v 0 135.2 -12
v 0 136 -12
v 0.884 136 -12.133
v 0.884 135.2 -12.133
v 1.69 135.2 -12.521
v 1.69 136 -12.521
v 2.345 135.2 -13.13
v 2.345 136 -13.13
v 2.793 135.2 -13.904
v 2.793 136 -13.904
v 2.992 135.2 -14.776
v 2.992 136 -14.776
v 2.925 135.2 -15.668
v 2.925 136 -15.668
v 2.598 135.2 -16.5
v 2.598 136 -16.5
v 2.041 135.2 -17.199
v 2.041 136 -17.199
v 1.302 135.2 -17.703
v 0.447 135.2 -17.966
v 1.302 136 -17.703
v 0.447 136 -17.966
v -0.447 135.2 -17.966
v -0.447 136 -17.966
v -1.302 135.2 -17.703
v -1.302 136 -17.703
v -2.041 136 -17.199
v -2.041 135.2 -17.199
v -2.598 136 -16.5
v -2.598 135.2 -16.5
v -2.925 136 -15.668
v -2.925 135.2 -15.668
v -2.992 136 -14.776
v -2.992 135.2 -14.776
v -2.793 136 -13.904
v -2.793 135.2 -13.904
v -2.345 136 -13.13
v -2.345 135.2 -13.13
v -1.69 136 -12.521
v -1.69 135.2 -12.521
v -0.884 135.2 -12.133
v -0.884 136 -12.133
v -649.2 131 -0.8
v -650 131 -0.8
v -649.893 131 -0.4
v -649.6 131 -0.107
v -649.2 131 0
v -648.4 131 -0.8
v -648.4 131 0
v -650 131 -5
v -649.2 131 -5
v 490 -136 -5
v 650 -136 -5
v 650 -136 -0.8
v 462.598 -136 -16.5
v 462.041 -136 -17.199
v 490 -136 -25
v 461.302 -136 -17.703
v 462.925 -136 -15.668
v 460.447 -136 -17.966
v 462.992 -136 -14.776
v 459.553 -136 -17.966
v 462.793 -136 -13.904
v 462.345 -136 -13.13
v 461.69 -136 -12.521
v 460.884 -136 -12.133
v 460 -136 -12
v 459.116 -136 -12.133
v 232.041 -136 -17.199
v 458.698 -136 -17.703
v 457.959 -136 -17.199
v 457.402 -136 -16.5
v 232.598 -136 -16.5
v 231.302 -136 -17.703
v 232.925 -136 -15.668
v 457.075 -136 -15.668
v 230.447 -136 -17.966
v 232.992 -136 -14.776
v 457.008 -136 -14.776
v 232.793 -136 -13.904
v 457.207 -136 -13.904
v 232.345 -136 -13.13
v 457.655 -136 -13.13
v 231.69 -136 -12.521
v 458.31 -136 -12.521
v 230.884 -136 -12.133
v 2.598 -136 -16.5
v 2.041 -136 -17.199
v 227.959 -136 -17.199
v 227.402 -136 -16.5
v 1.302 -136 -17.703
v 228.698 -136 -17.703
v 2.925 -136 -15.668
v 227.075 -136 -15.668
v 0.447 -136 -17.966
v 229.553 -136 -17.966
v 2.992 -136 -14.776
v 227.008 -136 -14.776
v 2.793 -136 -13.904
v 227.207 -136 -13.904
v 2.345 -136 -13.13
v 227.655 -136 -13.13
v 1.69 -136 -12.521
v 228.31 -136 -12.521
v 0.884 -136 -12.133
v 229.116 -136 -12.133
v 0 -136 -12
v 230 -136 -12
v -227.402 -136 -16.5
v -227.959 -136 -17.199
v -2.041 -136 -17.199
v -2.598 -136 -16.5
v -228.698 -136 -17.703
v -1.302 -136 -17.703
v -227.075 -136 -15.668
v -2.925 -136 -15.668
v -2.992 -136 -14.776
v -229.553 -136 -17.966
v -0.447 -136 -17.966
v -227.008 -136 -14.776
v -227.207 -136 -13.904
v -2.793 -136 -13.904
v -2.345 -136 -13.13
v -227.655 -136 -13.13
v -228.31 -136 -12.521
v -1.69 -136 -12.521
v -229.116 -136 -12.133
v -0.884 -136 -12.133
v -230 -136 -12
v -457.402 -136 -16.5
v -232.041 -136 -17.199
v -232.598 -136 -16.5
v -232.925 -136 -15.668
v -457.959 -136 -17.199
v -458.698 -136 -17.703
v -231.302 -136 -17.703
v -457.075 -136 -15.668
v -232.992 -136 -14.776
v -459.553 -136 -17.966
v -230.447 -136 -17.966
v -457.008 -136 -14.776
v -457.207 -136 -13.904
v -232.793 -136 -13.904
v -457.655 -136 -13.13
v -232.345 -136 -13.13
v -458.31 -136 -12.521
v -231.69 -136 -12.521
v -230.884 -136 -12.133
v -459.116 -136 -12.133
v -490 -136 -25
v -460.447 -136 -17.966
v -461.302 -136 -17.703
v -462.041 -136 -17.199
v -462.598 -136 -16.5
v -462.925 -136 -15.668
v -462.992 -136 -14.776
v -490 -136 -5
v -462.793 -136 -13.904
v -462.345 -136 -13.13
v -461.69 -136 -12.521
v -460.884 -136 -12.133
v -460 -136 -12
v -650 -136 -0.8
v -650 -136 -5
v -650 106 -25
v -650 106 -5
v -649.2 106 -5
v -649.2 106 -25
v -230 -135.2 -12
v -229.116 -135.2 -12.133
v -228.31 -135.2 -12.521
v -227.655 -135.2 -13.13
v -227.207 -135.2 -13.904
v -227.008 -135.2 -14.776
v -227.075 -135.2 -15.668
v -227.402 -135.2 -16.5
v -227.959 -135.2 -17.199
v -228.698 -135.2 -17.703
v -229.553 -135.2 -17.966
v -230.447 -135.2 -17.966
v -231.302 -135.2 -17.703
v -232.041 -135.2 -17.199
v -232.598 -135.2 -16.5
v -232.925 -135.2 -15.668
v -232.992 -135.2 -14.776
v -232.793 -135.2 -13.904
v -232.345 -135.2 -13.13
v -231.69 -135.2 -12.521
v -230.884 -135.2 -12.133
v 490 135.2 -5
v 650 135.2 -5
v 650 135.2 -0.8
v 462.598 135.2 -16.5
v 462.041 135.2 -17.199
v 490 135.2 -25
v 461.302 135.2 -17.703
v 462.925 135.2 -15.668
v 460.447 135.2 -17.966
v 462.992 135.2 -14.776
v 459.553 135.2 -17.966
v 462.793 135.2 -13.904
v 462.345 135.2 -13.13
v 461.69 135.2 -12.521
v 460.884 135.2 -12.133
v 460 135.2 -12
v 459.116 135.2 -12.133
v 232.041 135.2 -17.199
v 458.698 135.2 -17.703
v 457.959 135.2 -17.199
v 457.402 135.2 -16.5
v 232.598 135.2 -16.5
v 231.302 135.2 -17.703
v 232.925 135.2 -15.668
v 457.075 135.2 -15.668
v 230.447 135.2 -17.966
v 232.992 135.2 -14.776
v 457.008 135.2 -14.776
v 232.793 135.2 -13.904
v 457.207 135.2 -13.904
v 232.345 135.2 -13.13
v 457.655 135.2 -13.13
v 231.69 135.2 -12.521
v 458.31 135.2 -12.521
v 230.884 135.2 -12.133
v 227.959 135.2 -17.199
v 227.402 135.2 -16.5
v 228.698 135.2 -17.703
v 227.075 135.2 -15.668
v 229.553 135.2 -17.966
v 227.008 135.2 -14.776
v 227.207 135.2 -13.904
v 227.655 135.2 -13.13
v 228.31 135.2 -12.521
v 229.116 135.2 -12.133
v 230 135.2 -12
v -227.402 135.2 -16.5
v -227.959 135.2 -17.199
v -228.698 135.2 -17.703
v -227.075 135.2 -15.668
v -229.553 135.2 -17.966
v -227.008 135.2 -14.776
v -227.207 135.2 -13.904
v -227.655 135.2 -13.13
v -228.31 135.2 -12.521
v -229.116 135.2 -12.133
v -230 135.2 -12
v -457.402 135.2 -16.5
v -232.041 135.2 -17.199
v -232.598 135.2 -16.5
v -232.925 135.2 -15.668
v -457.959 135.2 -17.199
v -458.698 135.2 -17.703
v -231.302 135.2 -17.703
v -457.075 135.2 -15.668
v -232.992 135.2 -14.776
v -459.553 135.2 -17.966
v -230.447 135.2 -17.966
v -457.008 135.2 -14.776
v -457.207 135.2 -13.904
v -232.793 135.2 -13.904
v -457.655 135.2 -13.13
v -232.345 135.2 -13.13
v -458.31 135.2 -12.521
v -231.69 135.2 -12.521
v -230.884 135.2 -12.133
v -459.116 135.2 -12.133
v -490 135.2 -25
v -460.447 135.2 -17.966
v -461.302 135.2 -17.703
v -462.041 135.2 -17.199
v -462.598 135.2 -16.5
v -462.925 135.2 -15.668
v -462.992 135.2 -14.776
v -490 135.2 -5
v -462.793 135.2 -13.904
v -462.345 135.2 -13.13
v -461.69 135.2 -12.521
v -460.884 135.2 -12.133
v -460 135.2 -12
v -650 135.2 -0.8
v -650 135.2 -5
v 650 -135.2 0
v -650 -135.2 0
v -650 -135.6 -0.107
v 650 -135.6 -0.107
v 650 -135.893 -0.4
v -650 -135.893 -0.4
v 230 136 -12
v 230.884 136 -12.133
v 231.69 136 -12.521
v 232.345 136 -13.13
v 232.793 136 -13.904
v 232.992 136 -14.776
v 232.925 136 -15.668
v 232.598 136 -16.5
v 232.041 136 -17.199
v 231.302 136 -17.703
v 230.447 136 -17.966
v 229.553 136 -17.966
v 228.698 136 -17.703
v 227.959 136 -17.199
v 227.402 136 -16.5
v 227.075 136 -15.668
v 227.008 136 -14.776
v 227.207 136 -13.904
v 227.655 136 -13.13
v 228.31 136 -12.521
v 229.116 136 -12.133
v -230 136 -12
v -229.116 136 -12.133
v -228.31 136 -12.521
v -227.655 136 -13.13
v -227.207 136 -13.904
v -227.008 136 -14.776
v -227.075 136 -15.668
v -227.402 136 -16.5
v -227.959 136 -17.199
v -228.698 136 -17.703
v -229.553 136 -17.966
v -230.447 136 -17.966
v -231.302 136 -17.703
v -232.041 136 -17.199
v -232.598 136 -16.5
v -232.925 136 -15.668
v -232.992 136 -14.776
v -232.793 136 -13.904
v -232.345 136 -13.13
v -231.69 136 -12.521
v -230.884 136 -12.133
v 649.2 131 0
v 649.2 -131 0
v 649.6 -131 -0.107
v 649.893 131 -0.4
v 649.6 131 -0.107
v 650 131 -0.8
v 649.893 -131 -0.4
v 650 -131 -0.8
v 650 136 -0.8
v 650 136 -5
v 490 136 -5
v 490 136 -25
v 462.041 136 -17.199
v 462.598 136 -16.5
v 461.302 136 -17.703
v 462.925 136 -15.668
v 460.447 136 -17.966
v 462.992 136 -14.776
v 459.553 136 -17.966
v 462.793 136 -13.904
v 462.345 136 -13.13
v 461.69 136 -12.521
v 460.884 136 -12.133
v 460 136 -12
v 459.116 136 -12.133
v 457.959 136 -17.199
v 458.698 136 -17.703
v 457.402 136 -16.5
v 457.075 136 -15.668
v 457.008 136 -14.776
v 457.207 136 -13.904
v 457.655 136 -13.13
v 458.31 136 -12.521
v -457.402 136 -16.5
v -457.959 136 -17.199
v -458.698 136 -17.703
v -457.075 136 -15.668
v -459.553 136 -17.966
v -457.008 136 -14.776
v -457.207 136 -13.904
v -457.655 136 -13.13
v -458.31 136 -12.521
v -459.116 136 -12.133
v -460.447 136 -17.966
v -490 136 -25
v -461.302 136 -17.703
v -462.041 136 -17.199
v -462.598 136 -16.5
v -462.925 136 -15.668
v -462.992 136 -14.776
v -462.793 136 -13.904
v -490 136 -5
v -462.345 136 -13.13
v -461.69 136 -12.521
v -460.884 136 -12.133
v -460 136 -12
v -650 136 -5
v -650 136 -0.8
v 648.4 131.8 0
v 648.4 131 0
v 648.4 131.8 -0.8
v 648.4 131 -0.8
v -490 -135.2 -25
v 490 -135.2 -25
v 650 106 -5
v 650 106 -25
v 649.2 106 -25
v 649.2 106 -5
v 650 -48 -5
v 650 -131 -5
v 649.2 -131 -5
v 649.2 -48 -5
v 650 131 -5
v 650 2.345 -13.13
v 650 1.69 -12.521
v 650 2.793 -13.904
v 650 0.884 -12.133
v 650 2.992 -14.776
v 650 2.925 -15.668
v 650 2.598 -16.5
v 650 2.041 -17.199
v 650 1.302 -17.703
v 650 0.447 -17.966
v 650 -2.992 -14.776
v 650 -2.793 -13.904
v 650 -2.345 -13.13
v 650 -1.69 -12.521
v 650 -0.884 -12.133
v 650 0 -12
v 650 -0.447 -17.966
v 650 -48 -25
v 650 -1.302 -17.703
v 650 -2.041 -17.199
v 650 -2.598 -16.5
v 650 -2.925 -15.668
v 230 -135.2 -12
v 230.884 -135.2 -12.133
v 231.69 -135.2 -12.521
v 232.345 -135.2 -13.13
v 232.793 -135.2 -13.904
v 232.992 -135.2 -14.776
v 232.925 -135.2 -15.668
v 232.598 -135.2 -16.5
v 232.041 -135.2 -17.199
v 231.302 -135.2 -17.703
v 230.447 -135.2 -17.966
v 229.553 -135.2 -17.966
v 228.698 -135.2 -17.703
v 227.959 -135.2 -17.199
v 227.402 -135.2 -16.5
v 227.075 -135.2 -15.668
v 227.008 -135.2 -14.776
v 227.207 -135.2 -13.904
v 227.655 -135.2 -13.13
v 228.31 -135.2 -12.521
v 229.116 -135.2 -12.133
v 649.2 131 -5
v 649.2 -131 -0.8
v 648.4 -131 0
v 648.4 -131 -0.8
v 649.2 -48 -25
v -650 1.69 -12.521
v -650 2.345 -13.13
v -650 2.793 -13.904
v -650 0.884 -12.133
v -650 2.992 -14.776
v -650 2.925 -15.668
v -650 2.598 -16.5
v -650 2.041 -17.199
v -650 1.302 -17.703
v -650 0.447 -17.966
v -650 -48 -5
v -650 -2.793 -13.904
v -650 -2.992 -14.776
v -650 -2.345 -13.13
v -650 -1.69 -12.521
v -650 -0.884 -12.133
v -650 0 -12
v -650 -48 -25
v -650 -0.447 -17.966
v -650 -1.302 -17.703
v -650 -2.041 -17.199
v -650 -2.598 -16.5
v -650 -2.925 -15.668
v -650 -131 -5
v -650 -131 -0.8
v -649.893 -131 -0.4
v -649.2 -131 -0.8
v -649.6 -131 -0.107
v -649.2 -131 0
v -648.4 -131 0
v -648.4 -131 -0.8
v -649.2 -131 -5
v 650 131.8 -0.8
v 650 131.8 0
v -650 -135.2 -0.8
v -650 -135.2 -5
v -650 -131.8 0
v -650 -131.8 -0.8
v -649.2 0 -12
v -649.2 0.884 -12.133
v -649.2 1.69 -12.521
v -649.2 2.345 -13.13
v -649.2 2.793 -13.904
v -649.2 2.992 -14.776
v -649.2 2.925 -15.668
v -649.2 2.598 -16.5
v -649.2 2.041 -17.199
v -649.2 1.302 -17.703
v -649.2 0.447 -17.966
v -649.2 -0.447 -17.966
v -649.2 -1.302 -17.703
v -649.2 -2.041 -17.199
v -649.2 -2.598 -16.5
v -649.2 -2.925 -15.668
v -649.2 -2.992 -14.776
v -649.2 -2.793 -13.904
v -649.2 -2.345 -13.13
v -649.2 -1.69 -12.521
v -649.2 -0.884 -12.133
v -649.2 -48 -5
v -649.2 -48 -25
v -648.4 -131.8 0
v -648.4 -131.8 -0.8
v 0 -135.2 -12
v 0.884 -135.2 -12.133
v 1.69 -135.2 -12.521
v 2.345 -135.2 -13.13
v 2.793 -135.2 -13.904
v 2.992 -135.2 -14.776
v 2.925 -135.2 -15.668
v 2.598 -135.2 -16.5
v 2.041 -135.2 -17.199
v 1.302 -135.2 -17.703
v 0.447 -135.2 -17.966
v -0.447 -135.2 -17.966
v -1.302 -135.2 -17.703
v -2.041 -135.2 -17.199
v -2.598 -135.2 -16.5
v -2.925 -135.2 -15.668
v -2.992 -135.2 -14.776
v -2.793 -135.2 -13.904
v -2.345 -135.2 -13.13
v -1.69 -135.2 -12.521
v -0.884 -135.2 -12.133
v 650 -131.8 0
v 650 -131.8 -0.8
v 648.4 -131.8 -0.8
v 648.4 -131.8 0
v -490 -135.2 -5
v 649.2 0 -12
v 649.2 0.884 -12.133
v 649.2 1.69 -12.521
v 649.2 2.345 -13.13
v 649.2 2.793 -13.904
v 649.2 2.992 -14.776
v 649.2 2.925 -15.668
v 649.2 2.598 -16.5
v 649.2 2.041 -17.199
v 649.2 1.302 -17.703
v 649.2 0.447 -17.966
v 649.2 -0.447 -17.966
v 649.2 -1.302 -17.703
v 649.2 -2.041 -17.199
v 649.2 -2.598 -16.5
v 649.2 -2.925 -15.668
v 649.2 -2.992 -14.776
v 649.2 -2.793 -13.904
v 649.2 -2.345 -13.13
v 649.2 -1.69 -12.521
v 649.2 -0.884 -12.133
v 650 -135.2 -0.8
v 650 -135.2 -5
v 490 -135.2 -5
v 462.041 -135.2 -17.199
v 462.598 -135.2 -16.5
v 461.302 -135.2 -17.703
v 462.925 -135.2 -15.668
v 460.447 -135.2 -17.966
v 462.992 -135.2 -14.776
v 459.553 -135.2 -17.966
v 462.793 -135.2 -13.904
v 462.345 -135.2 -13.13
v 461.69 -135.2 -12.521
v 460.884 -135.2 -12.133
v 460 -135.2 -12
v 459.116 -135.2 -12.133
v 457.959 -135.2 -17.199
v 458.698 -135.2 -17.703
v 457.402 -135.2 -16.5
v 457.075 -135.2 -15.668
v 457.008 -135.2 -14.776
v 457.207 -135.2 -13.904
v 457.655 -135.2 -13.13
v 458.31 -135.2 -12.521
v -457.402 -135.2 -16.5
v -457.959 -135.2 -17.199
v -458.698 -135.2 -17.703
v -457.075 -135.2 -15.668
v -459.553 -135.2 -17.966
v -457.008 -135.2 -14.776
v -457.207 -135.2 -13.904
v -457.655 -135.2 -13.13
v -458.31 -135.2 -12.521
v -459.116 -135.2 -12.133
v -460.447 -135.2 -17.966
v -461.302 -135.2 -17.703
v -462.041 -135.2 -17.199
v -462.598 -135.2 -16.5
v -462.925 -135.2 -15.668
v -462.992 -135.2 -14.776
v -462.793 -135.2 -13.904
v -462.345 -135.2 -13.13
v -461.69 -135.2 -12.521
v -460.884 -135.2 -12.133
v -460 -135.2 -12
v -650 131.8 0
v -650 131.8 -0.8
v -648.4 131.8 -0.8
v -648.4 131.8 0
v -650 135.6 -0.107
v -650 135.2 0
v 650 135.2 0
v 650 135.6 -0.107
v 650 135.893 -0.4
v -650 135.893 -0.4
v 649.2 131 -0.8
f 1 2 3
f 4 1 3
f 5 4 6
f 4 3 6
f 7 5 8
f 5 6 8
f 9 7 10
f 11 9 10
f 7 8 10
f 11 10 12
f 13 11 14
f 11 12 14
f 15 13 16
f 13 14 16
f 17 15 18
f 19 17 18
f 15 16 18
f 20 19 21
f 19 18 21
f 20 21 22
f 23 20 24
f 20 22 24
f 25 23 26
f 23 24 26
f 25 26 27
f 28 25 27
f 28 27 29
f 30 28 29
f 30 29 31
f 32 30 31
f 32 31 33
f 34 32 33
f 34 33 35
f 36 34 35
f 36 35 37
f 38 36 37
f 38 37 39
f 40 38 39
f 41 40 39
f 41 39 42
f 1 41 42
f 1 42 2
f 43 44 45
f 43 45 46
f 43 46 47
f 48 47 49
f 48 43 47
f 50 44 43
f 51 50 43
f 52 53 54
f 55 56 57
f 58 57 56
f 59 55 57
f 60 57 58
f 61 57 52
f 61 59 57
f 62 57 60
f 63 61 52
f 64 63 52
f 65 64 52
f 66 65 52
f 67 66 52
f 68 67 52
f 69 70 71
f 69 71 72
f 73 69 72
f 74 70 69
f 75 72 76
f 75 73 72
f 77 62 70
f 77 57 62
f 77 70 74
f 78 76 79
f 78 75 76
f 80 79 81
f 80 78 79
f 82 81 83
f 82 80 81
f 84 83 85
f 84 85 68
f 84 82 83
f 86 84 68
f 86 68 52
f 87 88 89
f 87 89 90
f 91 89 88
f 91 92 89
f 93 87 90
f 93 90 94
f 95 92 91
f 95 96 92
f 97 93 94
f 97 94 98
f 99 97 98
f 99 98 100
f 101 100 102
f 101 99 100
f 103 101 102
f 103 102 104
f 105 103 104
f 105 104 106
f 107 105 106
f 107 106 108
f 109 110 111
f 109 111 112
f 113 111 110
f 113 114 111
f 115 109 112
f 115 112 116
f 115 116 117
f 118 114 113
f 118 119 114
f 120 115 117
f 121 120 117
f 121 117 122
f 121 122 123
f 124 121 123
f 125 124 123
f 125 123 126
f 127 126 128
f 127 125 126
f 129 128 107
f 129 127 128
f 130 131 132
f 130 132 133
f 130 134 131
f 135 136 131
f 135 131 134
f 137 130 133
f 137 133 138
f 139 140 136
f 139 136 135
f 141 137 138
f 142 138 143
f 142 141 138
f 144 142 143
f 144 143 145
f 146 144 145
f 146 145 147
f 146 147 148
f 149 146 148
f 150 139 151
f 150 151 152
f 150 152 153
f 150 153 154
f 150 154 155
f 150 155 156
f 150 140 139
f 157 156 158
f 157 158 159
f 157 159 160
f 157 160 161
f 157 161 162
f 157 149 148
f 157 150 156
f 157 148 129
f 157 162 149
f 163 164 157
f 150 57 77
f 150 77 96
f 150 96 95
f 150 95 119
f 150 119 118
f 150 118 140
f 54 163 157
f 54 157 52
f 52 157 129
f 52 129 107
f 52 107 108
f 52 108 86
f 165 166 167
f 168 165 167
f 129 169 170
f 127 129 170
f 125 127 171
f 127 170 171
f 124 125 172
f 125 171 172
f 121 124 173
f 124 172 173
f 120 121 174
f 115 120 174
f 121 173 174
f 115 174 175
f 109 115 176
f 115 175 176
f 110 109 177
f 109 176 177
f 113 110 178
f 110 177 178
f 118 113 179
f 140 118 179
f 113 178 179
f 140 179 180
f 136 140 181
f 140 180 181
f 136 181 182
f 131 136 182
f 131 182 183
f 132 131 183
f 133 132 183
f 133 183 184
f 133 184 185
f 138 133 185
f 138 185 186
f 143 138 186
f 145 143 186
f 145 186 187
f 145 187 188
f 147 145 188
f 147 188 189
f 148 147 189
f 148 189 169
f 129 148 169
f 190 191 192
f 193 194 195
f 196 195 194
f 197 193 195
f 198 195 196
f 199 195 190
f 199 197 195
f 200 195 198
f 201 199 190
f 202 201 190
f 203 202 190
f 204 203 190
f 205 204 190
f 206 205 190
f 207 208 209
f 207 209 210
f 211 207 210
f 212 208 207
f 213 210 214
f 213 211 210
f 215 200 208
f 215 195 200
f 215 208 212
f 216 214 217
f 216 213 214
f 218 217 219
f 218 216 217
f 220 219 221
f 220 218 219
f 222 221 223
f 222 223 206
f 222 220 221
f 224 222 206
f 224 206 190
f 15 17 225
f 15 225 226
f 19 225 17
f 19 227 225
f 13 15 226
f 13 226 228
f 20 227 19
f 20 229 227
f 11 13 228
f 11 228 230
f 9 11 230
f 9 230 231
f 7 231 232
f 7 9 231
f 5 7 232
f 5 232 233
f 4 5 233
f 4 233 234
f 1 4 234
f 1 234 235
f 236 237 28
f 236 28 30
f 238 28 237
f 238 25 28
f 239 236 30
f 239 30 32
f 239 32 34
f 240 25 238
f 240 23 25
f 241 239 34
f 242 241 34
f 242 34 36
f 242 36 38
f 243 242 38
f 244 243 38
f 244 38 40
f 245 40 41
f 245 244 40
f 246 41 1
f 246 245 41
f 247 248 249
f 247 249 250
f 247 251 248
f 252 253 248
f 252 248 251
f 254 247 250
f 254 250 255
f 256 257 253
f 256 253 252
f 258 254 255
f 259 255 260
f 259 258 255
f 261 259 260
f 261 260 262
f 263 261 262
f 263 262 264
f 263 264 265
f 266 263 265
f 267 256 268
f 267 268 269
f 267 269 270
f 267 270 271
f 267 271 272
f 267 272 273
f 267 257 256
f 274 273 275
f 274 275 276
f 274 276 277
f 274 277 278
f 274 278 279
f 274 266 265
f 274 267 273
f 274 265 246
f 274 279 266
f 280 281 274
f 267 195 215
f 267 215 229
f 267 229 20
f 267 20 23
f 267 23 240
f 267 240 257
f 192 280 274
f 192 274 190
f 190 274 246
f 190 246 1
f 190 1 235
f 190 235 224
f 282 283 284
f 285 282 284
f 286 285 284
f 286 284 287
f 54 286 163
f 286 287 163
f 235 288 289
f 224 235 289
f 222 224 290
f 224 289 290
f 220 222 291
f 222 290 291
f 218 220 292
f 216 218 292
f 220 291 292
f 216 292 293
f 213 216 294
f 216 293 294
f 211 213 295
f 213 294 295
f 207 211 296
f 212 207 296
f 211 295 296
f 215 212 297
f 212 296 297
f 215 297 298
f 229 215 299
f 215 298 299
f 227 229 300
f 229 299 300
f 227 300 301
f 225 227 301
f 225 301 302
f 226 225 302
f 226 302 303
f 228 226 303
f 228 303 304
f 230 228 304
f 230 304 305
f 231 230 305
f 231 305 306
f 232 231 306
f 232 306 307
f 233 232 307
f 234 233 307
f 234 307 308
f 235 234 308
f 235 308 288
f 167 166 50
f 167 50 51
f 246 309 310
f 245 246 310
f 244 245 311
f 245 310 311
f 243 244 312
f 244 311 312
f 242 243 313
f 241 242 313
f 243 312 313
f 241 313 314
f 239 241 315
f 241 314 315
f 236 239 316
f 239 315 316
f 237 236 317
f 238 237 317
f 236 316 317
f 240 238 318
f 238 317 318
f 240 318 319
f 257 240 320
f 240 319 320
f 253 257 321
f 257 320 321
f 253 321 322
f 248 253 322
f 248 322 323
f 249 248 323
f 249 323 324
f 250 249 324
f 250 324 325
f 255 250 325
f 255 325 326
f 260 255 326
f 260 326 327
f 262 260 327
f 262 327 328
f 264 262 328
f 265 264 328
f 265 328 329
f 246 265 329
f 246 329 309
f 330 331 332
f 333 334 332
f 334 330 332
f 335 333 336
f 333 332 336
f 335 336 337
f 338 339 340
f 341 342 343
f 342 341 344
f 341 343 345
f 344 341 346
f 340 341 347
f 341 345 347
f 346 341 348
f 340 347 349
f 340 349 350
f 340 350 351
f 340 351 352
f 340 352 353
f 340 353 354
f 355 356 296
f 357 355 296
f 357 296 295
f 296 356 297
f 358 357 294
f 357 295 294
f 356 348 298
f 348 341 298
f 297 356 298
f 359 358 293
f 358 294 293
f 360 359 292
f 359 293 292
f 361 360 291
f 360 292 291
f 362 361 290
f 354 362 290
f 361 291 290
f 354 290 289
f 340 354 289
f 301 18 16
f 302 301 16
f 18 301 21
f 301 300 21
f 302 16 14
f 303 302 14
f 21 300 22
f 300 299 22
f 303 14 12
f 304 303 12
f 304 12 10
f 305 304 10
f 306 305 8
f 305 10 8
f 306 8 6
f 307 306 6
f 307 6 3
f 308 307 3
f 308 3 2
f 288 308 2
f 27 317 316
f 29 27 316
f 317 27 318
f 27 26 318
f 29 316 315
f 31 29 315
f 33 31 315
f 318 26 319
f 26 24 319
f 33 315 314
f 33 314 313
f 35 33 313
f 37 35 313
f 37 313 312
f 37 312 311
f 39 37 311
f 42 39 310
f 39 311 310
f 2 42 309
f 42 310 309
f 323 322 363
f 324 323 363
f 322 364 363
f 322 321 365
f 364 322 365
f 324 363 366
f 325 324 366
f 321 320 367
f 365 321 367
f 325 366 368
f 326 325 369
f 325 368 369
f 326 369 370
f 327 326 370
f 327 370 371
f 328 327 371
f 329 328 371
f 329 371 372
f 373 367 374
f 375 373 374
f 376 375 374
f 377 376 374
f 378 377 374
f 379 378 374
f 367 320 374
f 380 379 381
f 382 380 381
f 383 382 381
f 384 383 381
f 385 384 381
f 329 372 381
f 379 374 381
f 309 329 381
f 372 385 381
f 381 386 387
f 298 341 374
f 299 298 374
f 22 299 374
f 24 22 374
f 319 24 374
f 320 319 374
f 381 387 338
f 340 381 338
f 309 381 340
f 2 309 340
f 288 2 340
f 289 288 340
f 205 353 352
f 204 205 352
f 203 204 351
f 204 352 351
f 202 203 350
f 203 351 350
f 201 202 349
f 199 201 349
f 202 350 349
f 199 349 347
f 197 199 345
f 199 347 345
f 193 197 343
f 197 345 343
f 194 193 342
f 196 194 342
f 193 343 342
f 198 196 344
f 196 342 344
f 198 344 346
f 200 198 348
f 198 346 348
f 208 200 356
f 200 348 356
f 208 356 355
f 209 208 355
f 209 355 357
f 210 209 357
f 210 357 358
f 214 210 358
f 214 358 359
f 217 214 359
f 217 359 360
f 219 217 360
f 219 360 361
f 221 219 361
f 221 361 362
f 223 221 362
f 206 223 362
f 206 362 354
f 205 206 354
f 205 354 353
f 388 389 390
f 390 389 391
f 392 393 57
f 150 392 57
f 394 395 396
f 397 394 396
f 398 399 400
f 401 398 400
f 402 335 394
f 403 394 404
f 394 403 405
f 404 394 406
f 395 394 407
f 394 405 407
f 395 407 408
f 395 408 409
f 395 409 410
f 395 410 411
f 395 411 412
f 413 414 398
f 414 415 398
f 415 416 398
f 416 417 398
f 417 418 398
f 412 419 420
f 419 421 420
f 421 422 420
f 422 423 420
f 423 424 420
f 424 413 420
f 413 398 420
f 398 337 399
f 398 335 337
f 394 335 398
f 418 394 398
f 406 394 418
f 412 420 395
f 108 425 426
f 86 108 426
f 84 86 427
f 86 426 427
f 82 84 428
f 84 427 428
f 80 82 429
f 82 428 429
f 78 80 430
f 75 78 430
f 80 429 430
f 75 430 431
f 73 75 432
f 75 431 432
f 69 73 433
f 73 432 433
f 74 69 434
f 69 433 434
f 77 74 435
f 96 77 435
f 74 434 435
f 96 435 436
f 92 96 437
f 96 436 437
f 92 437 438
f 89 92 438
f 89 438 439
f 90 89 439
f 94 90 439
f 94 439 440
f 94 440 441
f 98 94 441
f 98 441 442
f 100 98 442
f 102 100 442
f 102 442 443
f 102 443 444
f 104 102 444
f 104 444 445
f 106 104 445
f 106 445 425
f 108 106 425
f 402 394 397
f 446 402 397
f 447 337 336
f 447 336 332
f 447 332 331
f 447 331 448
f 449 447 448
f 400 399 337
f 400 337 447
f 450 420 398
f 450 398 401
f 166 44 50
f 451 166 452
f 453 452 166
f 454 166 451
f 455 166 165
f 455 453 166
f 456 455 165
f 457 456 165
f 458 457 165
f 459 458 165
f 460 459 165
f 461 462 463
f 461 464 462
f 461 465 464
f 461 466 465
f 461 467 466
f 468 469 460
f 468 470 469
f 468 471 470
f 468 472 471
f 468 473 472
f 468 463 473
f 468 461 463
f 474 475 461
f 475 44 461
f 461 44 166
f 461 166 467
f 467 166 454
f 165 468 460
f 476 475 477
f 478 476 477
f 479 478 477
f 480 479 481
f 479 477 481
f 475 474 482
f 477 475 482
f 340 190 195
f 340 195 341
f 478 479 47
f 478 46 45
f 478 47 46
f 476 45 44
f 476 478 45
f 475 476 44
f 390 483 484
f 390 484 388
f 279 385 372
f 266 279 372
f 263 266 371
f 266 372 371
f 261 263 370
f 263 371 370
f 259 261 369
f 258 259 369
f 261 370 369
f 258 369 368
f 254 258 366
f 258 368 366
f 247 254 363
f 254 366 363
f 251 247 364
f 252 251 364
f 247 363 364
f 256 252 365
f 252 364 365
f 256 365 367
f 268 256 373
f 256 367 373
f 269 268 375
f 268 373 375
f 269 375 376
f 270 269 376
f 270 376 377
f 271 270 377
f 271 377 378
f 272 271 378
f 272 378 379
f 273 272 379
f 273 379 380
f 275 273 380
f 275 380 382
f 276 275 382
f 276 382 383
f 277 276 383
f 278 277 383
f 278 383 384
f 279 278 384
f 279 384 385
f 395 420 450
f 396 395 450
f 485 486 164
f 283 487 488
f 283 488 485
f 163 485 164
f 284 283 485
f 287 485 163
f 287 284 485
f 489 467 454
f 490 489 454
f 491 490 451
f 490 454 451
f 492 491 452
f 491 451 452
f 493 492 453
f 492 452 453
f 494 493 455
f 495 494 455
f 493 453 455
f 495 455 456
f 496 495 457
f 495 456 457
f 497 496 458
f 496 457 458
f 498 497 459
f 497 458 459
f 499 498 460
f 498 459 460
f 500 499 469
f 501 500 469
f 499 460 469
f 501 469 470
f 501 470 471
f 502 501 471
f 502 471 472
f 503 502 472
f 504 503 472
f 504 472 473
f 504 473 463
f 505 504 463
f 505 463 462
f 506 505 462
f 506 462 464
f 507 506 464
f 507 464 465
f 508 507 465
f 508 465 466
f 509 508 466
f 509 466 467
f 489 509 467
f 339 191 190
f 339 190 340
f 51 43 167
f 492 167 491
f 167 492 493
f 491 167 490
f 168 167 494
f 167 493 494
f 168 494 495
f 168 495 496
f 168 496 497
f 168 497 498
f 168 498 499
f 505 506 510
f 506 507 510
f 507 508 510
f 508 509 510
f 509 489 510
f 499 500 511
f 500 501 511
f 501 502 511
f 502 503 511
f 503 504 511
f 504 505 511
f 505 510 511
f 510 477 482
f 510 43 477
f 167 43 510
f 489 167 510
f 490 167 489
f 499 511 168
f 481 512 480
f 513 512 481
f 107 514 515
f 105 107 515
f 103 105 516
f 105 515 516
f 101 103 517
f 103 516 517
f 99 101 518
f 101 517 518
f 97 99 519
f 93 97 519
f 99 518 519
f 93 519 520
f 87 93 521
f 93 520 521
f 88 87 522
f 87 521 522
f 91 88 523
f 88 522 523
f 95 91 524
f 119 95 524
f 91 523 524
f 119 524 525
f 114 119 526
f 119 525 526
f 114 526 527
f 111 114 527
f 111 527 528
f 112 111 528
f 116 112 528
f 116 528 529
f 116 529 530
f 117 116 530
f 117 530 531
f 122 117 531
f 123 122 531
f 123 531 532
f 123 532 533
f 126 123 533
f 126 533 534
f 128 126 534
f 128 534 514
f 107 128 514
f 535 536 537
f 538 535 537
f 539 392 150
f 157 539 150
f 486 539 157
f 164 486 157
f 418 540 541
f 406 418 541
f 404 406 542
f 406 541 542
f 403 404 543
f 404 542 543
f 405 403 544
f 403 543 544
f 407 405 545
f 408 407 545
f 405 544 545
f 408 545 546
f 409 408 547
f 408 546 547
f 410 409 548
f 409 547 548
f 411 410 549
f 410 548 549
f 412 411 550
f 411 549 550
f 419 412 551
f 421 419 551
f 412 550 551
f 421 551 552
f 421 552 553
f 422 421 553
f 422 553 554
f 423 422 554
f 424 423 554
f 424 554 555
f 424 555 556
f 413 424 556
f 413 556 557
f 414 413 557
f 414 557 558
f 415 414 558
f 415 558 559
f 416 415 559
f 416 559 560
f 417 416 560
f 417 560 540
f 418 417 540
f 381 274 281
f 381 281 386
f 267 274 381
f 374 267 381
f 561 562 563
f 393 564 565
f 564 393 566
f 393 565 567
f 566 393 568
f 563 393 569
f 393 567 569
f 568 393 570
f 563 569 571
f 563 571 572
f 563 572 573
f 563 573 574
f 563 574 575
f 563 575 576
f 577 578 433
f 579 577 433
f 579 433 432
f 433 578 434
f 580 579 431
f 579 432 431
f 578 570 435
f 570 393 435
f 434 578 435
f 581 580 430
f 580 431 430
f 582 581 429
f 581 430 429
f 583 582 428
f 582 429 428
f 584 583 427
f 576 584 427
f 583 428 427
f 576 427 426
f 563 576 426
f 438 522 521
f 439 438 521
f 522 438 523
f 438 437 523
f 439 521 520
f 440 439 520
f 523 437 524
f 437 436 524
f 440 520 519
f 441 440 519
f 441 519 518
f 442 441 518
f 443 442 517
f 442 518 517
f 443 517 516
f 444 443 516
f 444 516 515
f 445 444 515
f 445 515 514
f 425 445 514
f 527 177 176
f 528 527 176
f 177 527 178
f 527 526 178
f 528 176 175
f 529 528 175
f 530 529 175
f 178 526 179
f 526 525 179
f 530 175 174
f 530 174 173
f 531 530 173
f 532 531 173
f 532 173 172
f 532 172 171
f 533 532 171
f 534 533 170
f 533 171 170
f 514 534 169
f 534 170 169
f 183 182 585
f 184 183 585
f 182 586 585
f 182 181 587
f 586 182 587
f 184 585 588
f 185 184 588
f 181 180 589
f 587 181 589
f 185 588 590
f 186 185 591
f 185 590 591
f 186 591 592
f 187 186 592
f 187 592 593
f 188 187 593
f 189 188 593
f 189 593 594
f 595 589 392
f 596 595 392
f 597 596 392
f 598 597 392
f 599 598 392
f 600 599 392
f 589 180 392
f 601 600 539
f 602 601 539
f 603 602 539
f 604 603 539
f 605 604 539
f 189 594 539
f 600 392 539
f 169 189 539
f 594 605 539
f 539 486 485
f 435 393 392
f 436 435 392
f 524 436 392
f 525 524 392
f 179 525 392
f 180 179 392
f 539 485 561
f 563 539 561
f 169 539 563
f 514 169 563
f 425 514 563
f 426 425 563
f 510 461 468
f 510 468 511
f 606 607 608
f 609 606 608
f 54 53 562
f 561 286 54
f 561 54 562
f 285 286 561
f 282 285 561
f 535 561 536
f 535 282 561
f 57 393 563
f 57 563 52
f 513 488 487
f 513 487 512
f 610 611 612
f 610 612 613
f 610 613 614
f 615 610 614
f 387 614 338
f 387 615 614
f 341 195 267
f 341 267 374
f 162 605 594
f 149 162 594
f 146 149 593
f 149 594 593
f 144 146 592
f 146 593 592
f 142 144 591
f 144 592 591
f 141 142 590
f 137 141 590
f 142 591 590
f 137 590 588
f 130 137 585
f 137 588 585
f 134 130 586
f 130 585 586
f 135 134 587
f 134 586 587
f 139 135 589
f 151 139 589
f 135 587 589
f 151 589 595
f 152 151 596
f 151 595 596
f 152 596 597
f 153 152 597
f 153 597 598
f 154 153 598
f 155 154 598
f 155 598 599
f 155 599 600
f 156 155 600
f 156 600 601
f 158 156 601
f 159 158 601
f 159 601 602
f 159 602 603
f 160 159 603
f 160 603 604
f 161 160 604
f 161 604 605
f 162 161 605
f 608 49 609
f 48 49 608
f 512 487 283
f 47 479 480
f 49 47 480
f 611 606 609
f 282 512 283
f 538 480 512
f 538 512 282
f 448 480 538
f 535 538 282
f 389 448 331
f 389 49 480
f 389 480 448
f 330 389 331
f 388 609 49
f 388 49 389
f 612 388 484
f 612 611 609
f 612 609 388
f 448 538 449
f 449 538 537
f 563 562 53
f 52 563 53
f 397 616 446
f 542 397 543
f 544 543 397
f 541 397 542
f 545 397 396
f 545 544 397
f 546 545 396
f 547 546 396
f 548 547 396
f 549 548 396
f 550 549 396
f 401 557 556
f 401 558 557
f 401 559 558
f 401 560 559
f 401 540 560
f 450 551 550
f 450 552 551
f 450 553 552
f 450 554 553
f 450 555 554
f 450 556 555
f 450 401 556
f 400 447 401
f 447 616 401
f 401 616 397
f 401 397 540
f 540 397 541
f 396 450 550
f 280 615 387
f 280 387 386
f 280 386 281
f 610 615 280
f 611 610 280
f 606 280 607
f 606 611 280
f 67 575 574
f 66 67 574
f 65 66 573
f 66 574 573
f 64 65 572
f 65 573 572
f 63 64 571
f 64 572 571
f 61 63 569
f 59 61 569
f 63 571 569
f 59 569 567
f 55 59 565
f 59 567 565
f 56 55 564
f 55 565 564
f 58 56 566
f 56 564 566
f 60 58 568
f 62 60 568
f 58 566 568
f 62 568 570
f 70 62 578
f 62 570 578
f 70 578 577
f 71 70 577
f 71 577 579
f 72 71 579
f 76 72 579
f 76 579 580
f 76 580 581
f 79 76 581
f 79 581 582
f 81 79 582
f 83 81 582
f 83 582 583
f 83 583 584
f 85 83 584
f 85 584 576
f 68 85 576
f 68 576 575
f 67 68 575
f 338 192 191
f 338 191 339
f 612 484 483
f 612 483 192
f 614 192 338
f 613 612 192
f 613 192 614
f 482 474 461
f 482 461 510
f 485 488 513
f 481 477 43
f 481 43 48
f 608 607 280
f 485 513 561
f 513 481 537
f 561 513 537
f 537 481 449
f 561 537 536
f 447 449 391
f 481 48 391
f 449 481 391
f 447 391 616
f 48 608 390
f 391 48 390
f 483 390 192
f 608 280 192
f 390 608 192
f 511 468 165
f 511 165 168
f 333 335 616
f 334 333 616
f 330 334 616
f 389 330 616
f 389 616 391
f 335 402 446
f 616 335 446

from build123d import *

# Parameters (mm, degrees)
SKETCH_1_W                   = 1300
SKETCH_1_H                   = 272
SM_BASE_FLANGE_1_DEPTH       = 0.8
SM_START                     = -650
SM_EDGE_FLANGE_1_DEPTH       = 1300
SM_START_2                   = -490
SM_EDGE_FLANGE_1_2_OUTLINE_W = 0.8
SM_EDGE_FLANGE_1_2_OUTLINE_H = 24.2
SM_EDGE_FLANGE_1_2_DEPTH     = 980
SM_EDGE_FLANGE_1_3_OUTLINE_W = 0.8
SM_EDGE_FLANGE_1_3_OUTLINE_H = 4.2
SM_EDGE_FLANGE_1_3_DEPTH     = 1300
SKETCH_11_R                  = 3
CUT_EXTRUDE_1_DEPTH          = 706.059571951
SM_START_3                   = -131.8
SM_EDGE_FLANGE_2_DEPTH       = 263.6
SM_EDGE_FLANGE_2_2_DEPTH     = 0.8
SM_START_4                   = 131
SM_EDGE_FLANGE_2_3_DEPTH     = 0.8
SM_START_5                   = -48
SM_EDGE_FLANGE_2_4_OUTLINE_W = 0.8
SM_EDGE_FLANGE_2_4_OUTLINE_H = 24.2
SM_EDGE_FLANGE_2_4_DEPTH     = 154
SM_START_6                   = -131
SM_EDGE_FLANGE_2_5_OUTLINE_W = 0.8
SM_EDGE_FLANGE_2_5_OUTLINE_H = 4.2
SM_EDGE_FLANGE_2_5_DEPTH     = 262
SKETCH_15_R                  = 3
CUT_EXTRUDE_2_DEPTH          = 1308.33354581


# Read off the part's stored shape, not the designer's step: 边线-法兰1, 边线-法兰2
# Sheet-metal steps are written as plain solids
with BuildPart() as part:
    # Sketch 1 → 基体-法兰1 (new body)
    with BuildSketch(Plane.XY):
        Rectangle(SKETCH_1_W, SKETCH_1_H)
    extrude(amount=-SM_BASE_FLANGE_1_DEPTH)

    # 边线-法兰1 outline → 边线-法兰1 (cut)
    with BuildSketch(Plane.YZ.offset(SM_START)):
        with BuildLine():
            Line((136, 0), (135.2, 0))
            ThreePointArc((135.2, 0), (135.765685425, -0.234314575), (136, -0.8))
            Line((136, -0.8), (136, 0))
        make_face()
    sm_edge_flange_1 = extrude(amount=SM_EDGE_FLANGE_1_DEPTH, mode=Mode.SUBTRACT)

    # Sm Edge Flange 1 2 outline → Sm Edge Flange 1 2 (add)
    with BuildSketch(Plane.YZ.offset(SM_START_2)):
        with Locations((135.6, -12.9)):
            Rectangle(SM_EDGE_FLANGE_1_2_OUTLINE_W, SM_EDGE_FLANGE_1_2_OUTLINE_H)
    sm_edge_flange_1_2 = extrude(amount=SM_EDGE_FLANGE_1_2_DEPTH)

    # Sm Edge Flange 1 3 outline → Sm Edge Flange 1 3 (add)
    with BuildSketch(Plane.YZ.offset(SM_START)):
        with Locations((135.6, -2.9)):
            Rectangle(SM_EDGE_FLANGE_1_3_OUTLINE_W, SM_EDGE_FLANGE_1_3_OUTLINE_H)
    sm_edge_flange_1_3 = extrude(amount=SM_EDGE_FLANGE_1_3_DEPTH)

    # 镜向1: 边线-法兰1, Sm Edge Flange 1 2, Sm Edge Flange 1 3 across plane
    add(sm_edge_flange_1.mirror(Plane.ZX), mode=Mode.SUBTRACT)
    add(sm_edge_flange_1_2.mirror(Plane.ZX))
    add(sm_edge_flange_1_3.mirror(Plane.ZX))

    # 草图11 → 切除-拉伸1 (cut, through all)
    with BuildSketch(Plane(origin=(0, 136, 0), x_dir=(1, 0, 0), z_dir=(0, 1, 0))):
        with Locations(Location((0, 15, 0), (0, 0, 270))):
            Circle(SKETCH_11_R)
        with Locations(Location((230, 15, 0), (0, 0, 270))):
            Circle(SKETCH_11_R)
        with Locations(Location((460, 15, 0), (0, 0, 270))):
            Circle(SKETCH_11_R)
        with Locations(Location((-230, 15, 0), (0, 0, 270))):
            Circle(SKETCH_11_R)
        with Locations(Location((-460, 15, 0), (0, 0, 270))):
            Circle(SKETCH_11_R)
    extrude(amount=-CUT_EXTRUDE_1_DEPTH, mode=Mode.SUBTRACT)

    # 边线-法兰2 outline → 边线-法兰2 (cut)
    with BuildSketch(Plane(origin=(0, 0, 0), x_dir=(1, 0, 0), z_dir=(0, 1, 0)).offset(SM_START_3)):
        with BuildLine():
            ThreePointArc((-649.2, 0), (-649.765685425, 0.234314575), (-650, 0.8))
            Line((-650, 0.8), (-650, 0))
            Line((-650, 0), (-649.2, 0))
        make_face()
    sm_edge_flange_2 = extrude(amount=SM_EDGE_FLANGE_2_DEPTH, mode=Mode.SUBTRACT)

    # Sm Edge Flange 2 2 outline → Sm Edge Flange 2 2 (cut)
    with BuildSketch(Plane(origin=(0, 0, 0), x_dir=(1, 0, 0), z_dir=(0, 1, 0)).offset(SM_START_3)):
        with BuildLine():
            Line((-648.4, 0.8), (-650, 0.8))
            ThreePointArc((-650, 0.8), (-649.765685425, 0.234314575), (-649.2, 0))
            Line((-649.2, 0), (-648.4, 0))
            Line((-648.4, 0), (-648.4, 0.8))
        make_face()
    sm_edge_flange_2_2 = extrude(amount=SM_EDGE_FLANGE_2_2_DEPTH, mode=Mode.SUBTRACT)

    # Sm Edge Flange 2 3 outline → Sm Edge Flange 2 3 (cut)
    with BuildSketch(Plane(origin=(0, 0, 0), x_dir=(1, 0, 0), z_dir=(0, 1, 0)).offset(SM_START_4)):
        with BuildLine():
            Line((-648.4, 0.8), (-650, 0.8))
            ThreePointArc((-650, 0.8), (-649.765685425, 0.234314575), (-649.2, 0))
            Line((-649.2, 0), (-648.4, 0))
            Line((-648.4, 0), (-648.4, 0.8))
        make_face()
    sm_edge_flange_2_3 = extrude(amount=SM_EDGE_FLANGE_2_3_DEPTH, mode=Mode.SUBTRACT)

    # Sm Edge Flange 2 4 outline → Sm Edge Flange 2 4 (add)
    with BuildSketch(Plane(origin=(0, 0, 0), x_dir=(1, 0, 0), z_dir=(0, 1, 0)).offset(SM_START_5)):
        with Locations((-649.6, 12.9)):
            Rectangle(SM_EDGE_FLANGE_2_4_OUTLINE_W, SM_EDGE_FLANGE_2_4_OUTLINE_H)
    sm_edge_flange_2_4 = extrude(amount=SM_EDGE_FLANGE_2_4_DEPTH)

    # Sm Edge Flange 2 5 outline → Sm Edge Flange 2 5 (add)
    with BuildSketch(Plane(origin=(0, 0, 0), x_dir=(1, 0, 0), z_dir=(0, 1, 0)).offset(SM_START_6)):
        with Locations((-649.6, 2.9)):
            Rectangle(SM_EDGE_FLANGE_2_5_OUTLINE_W, SM_EDGE_FLANGE_2_5_OUTLINE_H)
    sm_edge_flange_2_5 = extrude(amount=SM_EDGE_FLANGE_2_5_DEPTH)

    # 镜向2: 边线-法兰2, Sm Edge Flange 2 2, Sm Edge Flange 2 3, Sm Edge Flange 2 4, Sm Edge Flange 2 5 across plane
    add(sm_edge_flange_2.mirror(Plane(origin=(0, 0, 0), x_dir=(0, 0, 1), z_dir=(1, 0, 0))), mode=Mode.SUBTRACT)
    add(sm_edge_flange_2_2.mirror(Plane(origin=(0, 0, 0), x_dir=(0, 0, 1), z_dir=(1, 0, 0))), mode=Mode.SUBTRACT)
    add(sm_edge_flange_2_3.mirror(Plane(origin=(0, 0, 0), x_dir=(0, 0, 1), z_dir=(1, 0, 0))), mode=Mode.SUBTRACT)
    add(sm_edge_flange_2_4.mirror(Plane(origin=(0, 0, 0), x_dir=(0, 0, 1), z_dir=(1, 0, 0))))
    add(sm_edge_flange_2_5.mirror(Plane(origin=(0, 0, 0), x_dir=(0, 0, 1), z_dir=(1, 0, 0))))

    # 草图15 → 切除-拉伸2 (cut, through all)
    with BuildSketch(Plane.ZY.offset(650)):
        with Locations((-15, 0)):
            Circle(SKETCH_15_R)
    extrude(amount=-CUT_EXTRUDE_2_DEPTH, mode=Mode.SUBTRACT)


solid = part.part
